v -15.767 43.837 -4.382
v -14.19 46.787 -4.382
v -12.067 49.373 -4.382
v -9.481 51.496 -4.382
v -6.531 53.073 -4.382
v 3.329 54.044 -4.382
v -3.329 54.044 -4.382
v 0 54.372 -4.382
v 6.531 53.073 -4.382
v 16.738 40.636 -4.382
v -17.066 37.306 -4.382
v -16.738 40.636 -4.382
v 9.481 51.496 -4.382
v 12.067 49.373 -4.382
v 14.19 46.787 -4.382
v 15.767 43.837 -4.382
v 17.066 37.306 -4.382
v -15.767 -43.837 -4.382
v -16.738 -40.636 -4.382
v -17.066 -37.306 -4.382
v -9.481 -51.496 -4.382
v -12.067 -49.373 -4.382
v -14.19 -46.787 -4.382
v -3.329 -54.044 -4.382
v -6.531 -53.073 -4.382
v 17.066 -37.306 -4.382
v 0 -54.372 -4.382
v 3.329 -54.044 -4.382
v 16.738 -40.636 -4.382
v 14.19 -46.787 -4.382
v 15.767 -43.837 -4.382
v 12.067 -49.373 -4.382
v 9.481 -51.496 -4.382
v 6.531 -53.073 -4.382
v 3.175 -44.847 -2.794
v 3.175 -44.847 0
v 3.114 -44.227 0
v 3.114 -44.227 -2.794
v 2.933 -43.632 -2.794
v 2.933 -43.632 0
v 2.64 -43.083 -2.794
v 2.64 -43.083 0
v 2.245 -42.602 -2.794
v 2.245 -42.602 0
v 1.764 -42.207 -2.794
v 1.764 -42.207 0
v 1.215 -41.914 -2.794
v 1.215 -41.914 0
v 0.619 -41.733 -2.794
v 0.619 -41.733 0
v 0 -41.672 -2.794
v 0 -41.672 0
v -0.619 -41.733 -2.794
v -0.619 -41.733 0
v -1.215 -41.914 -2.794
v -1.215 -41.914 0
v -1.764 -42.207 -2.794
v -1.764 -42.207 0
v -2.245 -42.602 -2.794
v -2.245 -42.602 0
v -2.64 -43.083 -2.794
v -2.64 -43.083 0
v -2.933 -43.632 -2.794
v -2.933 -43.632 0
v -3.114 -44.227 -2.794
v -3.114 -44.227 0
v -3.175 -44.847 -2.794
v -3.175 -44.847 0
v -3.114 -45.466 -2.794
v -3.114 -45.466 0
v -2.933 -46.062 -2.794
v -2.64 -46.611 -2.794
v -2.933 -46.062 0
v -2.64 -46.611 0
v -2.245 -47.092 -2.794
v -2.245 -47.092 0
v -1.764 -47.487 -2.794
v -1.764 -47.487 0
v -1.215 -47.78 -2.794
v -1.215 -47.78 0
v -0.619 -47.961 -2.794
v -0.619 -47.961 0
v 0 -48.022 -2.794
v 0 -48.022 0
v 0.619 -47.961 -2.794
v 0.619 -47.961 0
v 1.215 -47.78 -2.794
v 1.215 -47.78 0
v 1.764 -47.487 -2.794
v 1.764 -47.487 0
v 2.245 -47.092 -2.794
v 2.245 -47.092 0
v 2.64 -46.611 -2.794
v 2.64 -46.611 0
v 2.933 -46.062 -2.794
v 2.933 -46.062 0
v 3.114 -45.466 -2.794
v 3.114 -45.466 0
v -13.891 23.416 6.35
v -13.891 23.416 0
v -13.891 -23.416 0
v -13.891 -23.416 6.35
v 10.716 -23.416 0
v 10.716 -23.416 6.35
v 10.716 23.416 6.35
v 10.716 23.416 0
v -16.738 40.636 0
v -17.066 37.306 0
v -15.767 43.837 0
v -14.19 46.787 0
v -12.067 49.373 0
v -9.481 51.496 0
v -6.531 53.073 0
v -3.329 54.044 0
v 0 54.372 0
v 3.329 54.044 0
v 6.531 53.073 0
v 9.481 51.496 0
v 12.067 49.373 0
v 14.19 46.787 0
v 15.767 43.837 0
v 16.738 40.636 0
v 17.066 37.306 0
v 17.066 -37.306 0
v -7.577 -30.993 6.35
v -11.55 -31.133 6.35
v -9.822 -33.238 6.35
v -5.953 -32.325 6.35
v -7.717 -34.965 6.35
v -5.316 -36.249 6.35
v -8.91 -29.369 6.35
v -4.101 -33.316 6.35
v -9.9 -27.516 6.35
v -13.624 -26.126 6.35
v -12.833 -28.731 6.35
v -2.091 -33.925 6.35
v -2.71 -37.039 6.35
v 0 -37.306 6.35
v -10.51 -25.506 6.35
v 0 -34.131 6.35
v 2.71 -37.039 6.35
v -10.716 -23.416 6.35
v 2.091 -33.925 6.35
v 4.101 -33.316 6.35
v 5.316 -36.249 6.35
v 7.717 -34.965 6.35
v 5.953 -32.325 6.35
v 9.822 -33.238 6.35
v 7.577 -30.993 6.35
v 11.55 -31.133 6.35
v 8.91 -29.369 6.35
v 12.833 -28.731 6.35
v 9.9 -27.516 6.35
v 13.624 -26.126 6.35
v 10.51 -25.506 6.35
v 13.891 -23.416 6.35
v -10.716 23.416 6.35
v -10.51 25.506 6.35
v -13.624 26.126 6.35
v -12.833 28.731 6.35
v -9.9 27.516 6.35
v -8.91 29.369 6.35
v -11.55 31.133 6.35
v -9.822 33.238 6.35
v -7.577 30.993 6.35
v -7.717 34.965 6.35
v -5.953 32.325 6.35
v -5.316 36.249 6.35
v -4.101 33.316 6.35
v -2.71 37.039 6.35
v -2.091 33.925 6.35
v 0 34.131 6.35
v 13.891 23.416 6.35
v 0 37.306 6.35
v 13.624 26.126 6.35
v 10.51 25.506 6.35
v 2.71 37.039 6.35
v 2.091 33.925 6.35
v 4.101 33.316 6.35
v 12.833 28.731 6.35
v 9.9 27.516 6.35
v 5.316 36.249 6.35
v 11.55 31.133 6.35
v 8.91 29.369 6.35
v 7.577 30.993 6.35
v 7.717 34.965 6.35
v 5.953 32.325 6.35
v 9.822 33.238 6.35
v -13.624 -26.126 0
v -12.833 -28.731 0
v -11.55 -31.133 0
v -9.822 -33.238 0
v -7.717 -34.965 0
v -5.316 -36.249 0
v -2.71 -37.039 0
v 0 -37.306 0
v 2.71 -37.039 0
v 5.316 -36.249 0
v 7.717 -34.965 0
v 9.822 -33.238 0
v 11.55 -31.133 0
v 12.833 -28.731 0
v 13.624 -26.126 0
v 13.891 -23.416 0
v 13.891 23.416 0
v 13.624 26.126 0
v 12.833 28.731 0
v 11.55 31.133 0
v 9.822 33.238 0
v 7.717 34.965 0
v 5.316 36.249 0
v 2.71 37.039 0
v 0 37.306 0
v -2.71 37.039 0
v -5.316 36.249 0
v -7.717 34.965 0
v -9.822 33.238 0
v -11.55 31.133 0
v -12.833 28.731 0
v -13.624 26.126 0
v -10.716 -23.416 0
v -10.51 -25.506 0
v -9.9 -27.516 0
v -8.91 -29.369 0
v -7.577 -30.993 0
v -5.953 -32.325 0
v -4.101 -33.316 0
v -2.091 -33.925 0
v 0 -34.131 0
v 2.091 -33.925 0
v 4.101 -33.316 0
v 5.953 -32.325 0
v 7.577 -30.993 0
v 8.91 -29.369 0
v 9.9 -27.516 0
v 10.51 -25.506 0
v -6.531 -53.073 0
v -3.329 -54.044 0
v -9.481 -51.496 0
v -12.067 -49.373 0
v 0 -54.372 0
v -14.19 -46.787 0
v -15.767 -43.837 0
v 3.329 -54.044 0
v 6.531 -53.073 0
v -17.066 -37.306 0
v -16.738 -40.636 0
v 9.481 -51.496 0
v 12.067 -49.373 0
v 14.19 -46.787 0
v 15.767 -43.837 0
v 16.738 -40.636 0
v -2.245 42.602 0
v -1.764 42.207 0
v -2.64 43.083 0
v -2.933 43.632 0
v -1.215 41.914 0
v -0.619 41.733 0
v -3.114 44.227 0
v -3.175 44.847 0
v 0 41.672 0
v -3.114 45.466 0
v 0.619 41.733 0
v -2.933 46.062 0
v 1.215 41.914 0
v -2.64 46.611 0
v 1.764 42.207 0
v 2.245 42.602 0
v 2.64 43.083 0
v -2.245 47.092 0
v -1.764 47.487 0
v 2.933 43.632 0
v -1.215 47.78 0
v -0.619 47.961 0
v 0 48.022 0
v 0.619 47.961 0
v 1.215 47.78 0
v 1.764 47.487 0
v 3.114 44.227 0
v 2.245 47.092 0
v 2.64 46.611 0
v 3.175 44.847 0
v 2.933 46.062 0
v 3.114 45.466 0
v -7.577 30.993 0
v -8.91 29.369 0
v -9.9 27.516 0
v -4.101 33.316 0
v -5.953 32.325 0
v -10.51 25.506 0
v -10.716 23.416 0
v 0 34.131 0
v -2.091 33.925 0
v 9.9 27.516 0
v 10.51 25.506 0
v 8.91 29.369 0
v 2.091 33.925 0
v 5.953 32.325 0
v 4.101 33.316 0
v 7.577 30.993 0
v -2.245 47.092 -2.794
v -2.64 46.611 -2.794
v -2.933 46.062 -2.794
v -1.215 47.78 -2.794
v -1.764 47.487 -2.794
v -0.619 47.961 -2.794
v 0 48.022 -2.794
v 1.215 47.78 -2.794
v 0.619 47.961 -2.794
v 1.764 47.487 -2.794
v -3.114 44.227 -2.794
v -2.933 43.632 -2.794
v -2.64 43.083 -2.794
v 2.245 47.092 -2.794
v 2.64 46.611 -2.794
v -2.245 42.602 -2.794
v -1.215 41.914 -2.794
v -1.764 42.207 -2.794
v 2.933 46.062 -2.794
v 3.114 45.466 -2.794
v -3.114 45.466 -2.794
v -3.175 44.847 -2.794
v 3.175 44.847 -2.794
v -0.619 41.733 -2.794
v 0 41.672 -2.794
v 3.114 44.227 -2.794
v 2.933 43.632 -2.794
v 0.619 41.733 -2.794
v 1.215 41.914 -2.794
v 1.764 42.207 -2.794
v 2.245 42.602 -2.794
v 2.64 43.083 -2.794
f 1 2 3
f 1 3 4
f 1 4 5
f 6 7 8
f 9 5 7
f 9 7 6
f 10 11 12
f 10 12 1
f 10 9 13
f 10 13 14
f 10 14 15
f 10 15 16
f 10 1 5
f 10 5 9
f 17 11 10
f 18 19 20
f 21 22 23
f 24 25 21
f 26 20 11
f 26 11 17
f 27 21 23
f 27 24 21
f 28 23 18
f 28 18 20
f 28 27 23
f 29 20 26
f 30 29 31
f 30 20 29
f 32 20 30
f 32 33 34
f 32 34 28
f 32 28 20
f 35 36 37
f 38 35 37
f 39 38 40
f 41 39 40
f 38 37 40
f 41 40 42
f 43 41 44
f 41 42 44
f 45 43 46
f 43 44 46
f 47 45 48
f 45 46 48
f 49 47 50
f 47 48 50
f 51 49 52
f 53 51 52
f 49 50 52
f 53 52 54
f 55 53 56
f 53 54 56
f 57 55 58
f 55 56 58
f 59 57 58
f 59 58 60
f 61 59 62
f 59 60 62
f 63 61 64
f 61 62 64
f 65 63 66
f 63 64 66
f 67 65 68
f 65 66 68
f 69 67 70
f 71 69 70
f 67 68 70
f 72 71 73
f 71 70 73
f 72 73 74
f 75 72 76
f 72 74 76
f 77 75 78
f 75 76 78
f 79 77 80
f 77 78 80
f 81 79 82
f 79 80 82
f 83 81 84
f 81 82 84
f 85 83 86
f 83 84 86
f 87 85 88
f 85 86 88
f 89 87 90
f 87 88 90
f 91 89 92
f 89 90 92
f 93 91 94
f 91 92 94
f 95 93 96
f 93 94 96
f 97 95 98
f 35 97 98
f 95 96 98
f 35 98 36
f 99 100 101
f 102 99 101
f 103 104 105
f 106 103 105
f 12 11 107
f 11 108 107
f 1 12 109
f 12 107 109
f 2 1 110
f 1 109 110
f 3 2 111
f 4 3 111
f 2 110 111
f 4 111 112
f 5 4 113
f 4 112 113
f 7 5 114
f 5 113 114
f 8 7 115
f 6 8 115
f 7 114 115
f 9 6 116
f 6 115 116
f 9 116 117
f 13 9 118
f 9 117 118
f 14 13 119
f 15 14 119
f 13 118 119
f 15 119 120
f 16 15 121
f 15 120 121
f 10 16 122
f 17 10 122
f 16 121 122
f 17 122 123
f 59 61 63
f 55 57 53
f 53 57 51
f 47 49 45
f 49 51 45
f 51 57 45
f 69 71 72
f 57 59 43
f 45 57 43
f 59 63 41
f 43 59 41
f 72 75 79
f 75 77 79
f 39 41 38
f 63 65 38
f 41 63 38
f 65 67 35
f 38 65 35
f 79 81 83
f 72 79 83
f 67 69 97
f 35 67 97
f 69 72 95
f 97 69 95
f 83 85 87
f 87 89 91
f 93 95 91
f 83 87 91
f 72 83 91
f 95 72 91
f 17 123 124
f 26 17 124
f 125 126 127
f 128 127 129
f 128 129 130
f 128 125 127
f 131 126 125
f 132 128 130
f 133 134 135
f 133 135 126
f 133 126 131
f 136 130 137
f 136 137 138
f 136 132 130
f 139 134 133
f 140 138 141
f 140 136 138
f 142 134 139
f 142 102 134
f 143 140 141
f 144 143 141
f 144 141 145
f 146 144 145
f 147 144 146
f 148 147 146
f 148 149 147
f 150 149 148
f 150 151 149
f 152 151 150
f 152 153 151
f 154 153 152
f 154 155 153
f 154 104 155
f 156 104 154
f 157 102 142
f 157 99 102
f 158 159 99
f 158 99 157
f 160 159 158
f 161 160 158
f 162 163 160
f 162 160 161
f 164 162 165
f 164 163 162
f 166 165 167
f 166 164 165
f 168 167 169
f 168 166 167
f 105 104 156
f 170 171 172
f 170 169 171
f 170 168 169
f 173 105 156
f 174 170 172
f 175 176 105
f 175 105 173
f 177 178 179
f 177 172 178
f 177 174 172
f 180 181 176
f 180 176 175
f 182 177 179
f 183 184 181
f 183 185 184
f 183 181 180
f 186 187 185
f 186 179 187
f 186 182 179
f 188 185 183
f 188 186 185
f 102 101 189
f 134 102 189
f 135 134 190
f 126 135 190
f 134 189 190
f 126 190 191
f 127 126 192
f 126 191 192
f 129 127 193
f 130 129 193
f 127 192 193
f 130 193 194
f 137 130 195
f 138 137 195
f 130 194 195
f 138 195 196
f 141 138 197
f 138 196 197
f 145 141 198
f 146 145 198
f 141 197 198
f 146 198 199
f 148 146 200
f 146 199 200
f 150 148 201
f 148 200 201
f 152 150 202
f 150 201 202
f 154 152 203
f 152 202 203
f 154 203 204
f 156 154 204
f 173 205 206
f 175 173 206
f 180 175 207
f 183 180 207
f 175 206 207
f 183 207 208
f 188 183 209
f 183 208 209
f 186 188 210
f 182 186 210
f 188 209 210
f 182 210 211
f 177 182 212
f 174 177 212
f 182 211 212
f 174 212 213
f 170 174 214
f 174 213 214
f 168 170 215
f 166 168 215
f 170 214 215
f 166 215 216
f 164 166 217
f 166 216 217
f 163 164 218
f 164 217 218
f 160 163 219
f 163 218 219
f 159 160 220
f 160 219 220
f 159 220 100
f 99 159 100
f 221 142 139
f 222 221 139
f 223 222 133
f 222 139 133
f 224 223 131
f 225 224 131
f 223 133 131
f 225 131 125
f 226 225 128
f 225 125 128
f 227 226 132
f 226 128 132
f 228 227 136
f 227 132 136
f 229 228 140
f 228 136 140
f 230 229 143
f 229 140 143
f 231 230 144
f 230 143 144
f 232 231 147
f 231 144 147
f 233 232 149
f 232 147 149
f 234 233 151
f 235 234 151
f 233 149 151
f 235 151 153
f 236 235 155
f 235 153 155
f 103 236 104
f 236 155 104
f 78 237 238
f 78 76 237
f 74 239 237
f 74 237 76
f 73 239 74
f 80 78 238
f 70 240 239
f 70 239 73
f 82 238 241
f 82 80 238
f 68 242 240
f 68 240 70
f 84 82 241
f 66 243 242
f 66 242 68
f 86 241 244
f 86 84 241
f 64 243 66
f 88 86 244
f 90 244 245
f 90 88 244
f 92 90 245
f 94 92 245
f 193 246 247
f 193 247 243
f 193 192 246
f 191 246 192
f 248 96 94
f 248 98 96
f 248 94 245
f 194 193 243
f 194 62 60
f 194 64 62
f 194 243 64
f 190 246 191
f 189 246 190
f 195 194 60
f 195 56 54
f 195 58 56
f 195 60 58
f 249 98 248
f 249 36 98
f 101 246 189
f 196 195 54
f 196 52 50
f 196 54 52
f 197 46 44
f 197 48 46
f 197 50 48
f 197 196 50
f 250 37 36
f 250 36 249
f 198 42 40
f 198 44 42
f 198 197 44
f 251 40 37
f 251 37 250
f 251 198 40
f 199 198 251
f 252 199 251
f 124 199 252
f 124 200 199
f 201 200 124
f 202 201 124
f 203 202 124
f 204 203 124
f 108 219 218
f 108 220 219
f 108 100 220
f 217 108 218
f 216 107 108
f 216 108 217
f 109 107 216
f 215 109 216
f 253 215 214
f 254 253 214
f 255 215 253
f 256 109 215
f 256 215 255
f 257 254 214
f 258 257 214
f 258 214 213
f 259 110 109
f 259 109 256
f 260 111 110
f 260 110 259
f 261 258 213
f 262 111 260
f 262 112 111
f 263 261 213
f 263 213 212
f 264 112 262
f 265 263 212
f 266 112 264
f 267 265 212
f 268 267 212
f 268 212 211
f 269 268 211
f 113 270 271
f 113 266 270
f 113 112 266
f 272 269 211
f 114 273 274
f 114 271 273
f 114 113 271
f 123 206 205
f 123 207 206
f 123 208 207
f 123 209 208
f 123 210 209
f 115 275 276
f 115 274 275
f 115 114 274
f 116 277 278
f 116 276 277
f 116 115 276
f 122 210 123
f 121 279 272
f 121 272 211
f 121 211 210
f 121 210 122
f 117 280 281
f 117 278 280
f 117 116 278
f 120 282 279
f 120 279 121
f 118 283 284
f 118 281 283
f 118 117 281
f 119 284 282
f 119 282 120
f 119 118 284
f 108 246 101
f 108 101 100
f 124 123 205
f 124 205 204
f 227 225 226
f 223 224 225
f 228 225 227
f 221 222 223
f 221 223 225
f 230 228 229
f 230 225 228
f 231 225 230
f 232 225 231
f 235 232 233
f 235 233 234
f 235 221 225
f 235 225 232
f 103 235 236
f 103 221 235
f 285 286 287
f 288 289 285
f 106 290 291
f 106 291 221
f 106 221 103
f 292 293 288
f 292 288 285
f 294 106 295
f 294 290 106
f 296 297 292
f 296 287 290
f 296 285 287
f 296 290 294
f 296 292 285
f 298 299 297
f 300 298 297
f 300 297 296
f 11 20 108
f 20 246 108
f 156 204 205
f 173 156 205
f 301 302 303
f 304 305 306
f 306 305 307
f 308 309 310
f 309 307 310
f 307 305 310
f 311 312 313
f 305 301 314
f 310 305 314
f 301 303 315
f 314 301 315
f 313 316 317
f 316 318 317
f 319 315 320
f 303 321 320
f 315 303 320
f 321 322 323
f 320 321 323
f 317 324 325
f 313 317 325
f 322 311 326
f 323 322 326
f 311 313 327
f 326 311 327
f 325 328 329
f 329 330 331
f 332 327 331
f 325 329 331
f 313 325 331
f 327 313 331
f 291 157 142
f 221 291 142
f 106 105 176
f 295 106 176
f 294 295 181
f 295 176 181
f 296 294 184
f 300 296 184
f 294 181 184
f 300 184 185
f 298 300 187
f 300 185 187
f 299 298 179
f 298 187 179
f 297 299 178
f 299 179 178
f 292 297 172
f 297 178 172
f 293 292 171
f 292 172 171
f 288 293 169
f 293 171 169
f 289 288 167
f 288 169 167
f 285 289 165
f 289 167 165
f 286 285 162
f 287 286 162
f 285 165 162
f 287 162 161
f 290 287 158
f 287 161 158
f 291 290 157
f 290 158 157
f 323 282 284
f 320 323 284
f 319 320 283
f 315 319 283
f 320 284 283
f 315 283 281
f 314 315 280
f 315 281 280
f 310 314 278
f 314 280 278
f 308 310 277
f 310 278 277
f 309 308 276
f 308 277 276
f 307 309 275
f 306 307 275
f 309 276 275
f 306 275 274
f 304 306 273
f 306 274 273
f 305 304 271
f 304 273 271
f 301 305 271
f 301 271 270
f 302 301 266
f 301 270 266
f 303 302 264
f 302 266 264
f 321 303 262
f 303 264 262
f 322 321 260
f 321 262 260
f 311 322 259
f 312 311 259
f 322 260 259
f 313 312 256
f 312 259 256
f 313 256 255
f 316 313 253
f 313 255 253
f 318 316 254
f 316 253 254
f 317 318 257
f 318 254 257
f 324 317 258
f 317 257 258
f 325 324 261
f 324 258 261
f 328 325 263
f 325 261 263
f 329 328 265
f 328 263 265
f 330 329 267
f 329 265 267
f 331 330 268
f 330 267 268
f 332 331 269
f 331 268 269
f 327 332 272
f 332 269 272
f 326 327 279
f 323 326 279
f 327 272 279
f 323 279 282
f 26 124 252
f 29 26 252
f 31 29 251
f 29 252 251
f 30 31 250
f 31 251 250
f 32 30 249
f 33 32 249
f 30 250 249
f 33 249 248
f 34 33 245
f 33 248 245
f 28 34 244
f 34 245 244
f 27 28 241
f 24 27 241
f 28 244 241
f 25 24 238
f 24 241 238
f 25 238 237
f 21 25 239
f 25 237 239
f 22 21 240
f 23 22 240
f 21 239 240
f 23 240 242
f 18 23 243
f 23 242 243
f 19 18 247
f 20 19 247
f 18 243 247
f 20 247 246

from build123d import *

# Parameters (mm, degrees)
F1_DEPTH = 6.35
F0_R     = 3.175
F2_DEPTH = 2.794
F4_DEPTH = 1.5875
F6_DEPTH = 6.35


with BuildPart() as f1:
    # F0 (on Top) → F1 (new body)
    with BuildSketch(Plane.XY):
        with BuildLine():
            ThreePointArc((13.890625, 23.415625), (0, 37.30625), (-13.890625, 23.415625))
            Line((-13.890625, 23.415625), (-13.890625, -23.415625))
            ThreePointArc((-13.890625, -23.415625), (0, -37.30625), (13.890625, -23.415625))
            Line((13.890625, -23.415625), (13.890625, 23.415625))
        make_face()
    extrude(amount=F1_DEPTH)

    # F0 (on Top) → F2 (join)
    with BuildSketch(Plane.XY):
        with BuildLine():
            ThreePointArc((17.065625, 37.30625), (0, 54.371875), (-17.065625, 37.30625))
            Line((-17.065625, 37.30625), (-17.065625, -37.30625))
            ThreePointArc((-17.065625, -37.30625), (0, -54.371875), (17.065625, -37.30625))
            Line((17.065625, -37.30625), (17.065625, 37.30625))
        make_face()
        with Locations((0, -44.846875)):
            Circle(F0_R, mode=Mode.SUBTRACT)
        with BuildLine():
            Line((-13.890625, -23.415625), (-13.890625, 23.415625))
            ThreePointArc((-13.890625, 23.415625), (0, 37.30625), (13.890625, 23.415625))
            Line((13.890625, 23.415625), (13.890625, -23.415625))
            ThreePointArc((13.890625, -23.415625), (0, -37.30625), (-13.890625, -23.415625))
        make_face(mode=Mode.SUBTRACT)
        with Locations((0, 44.846875)):
            Circle(F0_R, mode=Mode.SUBTRACT)
        with BuildLine():
            ThreePointArc((13.890625, 23.415625), (0, 37.30625), (-13.890625, 23.415625))
            Line((-13.890625, 23.415625), (-13.890625, -23.415625))
            ThreePointArc((-13.890625, -23.415625), (0, -37.30625), (13.890625, -23.415625))
            Line((13.890625, -23.415625), (13.890625, 23.415625))
        make_face()
    extrude(amount=-F2_DEPTH)

    # F3 (on face) → F4 (join)
    with BuildSketch(Plane(origin=(0, 0, -2.794), x_dir=(1, 0, 0), z_dir=(0, 0, -1))):
        with BuildLine():
            ThreePointArc((17.065625, 37.30625), (0, 54.371875), (-17.065625, 37.30625))
            Line((-17.065625, 37.30625), (-17.065625, -37.30625))
            ThreePointArc((-17.065625, -37.30625), (0, -54.371875), (17.065625, -37.30625))
            Line((17.065625, -37.30625), (17.065625, 37.30625))
        make_face()
    extrude(amount=F4_DEPTH)

    # F5 (on face) → F6 (cut, through all)
    with BuildSketch(Plane.XY.offset(6.35)):
        with BuildLine():
            ThreePointArc((10.715625, 23.415625), (0, 34.13125), (-10.715625, 23.415625))
            Line((-10.715625, 23.415625), (-10.715625, -23.415625))
            ThreePointArc((-10.715625, -23.415625), (0, -34.13125), (10.715625, -23.415625))
            Line((10.715625, -23.415625), (10.715625, 23.415625))
        make_face()
    extrude(amount=-F6_DEPTH, mode=Mode.SUBTRACT)


solid = f1.part
